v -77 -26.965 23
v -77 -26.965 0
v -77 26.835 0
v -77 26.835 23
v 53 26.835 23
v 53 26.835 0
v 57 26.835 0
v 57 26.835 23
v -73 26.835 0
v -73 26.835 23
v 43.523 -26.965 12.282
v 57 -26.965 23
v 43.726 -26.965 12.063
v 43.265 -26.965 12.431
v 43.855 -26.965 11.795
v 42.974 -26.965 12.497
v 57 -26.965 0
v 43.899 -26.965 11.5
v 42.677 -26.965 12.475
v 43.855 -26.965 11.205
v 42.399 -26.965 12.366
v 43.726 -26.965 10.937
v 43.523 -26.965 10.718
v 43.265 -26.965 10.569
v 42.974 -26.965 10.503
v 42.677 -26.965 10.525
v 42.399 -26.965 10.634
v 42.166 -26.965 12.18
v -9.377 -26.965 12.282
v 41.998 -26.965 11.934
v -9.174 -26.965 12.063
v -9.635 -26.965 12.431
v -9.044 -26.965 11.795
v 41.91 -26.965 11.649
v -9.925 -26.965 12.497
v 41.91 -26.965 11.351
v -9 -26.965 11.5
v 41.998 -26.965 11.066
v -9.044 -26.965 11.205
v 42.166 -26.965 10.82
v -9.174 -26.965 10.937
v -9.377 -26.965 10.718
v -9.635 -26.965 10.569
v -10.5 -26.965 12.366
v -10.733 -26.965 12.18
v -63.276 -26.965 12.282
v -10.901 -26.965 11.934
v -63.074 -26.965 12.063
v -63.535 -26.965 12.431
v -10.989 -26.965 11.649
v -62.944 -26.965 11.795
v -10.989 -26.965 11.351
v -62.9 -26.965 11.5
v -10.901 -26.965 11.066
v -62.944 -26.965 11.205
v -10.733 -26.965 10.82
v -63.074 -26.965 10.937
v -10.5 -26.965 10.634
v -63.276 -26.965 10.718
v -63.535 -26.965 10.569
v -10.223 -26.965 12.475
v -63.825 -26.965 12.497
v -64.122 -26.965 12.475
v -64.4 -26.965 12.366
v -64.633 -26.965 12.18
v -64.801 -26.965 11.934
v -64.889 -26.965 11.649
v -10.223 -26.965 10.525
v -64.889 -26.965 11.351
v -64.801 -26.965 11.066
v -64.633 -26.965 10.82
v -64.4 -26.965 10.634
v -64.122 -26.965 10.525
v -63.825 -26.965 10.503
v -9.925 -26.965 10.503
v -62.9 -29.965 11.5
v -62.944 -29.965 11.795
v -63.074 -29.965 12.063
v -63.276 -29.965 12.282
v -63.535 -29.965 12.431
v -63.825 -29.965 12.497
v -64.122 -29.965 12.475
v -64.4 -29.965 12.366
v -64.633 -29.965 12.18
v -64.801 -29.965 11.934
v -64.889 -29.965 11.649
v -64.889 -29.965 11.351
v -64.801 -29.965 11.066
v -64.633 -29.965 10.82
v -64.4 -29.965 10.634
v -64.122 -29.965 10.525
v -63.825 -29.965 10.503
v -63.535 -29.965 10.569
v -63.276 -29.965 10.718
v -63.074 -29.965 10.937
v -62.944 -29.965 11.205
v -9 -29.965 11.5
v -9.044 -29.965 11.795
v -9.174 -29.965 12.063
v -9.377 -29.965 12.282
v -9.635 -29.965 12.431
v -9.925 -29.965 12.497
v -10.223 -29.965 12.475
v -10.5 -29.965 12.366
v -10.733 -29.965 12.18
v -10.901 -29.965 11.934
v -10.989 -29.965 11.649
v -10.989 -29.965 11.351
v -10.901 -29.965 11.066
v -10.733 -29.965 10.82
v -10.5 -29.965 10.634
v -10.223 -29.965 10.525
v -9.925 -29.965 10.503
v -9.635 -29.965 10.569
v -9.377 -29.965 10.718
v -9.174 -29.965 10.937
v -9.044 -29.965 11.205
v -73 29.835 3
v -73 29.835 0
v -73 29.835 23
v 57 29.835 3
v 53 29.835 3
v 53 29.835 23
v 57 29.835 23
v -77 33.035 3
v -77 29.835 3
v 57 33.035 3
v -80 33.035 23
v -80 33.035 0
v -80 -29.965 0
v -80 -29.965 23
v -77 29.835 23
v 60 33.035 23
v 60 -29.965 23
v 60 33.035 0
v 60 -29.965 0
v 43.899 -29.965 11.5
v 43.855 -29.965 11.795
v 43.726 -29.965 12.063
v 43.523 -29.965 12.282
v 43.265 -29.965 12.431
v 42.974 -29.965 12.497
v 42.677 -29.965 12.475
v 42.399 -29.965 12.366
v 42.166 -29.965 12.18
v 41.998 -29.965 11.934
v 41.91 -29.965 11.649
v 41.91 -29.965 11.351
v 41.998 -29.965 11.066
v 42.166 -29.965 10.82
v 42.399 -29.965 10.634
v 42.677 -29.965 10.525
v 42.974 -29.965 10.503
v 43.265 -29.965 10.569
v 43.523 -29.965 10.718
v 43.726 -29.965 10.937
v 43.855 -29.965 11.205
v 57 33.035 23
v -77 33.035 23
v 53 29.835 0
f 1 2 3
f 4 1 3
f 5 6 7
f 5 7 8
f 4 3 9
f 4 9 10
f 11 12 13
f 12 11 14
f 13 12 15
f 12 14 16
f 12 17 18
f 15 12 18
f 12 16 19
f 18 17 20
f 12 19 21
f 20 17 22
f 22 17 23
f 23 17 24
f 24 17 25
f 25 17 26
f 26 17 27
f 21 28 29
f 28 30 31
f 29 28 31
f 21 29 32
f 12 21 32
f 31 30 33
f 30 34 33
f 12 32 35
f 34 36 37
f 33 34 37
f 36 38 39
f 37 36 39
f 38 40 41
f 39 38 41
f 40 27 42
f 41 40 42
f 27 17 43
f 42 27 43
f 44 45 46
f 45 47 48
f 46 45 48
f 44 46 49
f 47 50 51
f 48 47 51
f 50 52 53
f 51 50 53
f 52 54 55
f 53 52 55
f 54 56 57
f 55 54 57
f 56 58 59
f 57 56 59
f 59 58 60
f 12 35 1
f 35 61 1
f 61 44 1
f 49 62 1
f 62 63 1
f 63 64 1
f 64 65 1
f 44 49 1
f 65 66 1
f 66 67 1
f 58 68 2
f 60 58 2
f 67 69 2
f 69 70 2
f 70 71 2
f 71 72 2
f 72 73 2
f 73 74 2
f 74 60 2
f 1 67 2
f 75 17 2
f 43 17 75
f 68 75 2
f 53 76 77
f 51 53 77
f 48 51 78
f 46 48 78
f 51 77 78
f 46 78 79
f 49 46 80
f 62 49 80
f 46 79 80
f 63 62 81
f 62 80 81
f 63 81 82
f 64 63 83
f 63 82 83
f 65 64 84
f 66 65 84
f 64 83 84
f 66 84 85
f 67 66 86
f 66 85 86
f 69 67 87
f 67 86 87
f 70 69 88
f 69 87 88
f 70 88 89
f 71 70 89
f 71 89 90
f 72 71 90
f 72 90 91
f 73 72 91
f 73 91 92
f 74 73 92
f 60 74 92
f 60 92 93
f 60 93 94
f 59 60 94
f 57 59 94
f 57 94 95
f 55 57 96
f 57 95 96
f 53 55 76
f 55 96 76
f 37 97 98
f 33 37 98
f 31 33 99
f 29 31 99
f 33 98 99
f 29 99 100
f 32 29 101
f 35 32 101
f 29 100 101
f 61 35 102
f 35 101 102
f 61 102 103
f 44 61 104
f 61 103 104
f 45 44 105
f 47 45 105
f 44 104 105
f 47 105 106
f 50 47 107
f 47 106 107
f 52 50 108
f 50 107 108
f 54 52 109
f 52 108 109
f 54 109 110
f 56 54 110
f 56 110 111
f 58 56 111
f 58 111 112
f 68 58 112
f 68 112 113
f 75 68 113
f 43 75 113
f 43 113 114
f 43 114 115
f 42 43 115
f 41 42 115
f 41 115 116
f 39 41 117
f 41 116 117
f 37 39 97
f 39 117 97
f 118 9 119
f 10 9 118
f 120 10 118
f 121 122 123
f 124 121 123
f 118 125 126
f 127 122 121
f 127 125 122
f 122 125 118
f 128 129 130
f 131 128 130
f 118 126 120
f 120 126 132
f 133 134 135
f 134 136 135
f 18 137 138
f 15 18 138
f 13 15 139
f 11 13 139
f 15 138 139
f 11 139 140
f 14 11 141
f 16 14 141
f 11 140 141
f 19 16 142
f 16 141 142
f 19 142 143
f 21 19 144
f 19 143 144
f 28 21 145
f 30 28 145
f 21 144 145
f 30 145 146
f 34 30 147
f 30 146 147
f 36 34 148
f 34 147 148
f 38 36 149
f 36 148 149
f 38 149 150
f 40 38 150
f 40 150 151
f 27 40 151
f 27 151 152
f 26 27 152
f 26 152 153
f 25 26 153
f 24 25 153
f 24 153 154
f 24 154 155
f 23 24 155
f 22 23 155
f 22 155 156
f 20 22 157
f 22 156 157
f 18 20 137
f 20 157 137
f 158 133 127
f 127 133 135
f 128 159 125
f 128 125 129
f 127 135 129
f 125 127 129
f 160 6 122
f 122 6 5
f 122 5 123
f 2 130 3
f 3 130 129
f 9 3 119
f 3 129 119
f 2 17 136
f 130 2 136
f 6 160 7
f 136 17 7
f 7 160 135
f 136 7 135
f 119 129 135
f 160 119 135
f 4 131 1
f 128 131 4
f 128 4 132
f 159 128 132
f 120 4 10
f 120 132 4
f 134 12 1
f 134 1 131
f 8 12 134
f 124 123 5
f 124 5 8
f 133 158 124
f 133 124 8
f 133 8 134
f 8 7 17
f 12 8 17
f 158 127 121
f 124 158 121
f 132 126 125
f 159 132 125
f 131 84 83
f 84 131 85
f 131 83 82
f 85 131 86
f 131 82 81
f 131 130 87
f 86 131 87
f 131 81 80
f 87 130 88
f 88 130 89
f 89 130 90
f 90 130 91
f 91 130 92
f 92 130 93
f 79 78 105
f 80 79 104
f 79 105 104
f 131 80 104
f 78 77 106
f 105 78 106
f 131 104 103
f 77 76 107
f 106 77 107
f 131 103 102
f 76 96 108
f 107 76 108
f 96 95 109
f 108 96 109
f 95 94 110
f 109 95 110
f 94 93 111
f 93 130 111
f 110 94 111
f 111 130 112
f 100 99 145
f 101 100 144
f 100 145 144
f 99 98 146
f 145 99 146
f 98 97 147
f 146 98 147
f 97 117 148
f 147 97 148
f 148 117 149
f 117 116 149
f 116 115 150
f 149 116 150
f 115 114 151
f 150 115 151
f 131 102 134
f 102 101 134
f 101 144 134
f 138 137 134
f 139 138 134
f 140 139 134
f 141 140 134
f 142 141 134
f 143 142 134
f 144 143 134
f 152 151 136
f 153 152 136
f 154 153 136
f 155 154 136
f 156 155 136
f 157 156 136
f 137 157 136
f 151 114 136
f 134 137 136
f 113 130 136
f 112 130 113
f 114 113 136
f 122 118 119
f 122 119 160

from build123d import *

# Parameters (mm, degrees)
F0_R      = 8
F1_DEPTH  = 3
F2_W      = 3
F2_H      = 3
F2_W_2    = 134
F3_DEPTH  = 20
F4_W      = 3
F4_H      = 20
F5_DEPTH  = 134
F6_W      = 126
F6_H      = 3
F7_DEPTH  = 40
F8_R      = 1.5
F9_DEPTH  = 3
F10_R     = 8
F12_DEPTH = 40
F13_R     = 1
F14_DEPTH = 3


with BuildPart() as f1:
    # F0 (on Top) → F1 (new body)
    with BuildSketch(Plane.XY):
        Polygon((-60, 33.034884), (-80, 33.034884), (-80, 18.034884), (-80, 0.034884), (-80, -2.965116), (-80, -17.965116), (-80, -29.965116), (60, -29.965116), (60, -24.965116), (60, -14.965116), (60, -9.965116), (60, -4.965116), (60, 0.034884), (60, 18.034884), (60, 33.034884), (40, 33.034884), (20, 33.034884), (0, 33.034884), (-20, 33.034884), (-40, 33.034884), align=None)
        with Locations((25, -0.468963)):
            Circle(F0_R, mode=Mode.SUBTRACT)
        with Locations((-45, 1.034884)):
            Circle(F0_R, mode=Mode.SUBTRACT)
    extrude(amount=F1_DEPTH)

    # F2 (on face) → F3 (join)
    with BuildSketch(Plane.XY.offset(3)):
        with Locations((-78.5, -28.465116)):
            Rectangle(F2_W, F2_H)
        with Locations((-10, -28.465116)):
            Rectangle(F2_W_2, F2_H)
        Polygon((-80, 30.034884), (-80, -26.965116), (-77, -26.965116), (-77, 33.034884), (-80, 33.034884), align=None)
        with Locations((58.5, -28.465116)):
            Rectangle(F2_W, F2_H)
        Polygon((57, 33.034884), (57, -26.965116), (60, -26.965116), (60, 30.034884), (60, 33.034884), align=None)
    extrude(amount=F3_DEPTH)

    # F4 (on face) → F5 (join)
    with BuildSketch(Plane.YZ.offset(-77)):
        with Locations((28.334884, 13)):
            Rectangle(F4_W, F4_H)
    extrude(amount=F5_DEPTH)

    # F6 (on face) → F7 (cut)
    with BuildSketch(Plane.XY.offset(23)):
        with Locations((-10, 28.334884)):
            Rectangle(F6_W, F6_H)
    extrude(amount=-F7_DEPTH, mode=Mode.SUBTRACT)

    # F8 (on face) → F9 (cut)
    with BuildSketch(Plane(origin=(0, -26.965116, 0), x_dir=(-1, 0, 0), z_dir=(0, 1, 0))):
        with Locations((47, 26.988985)):
            Circle(F8_R)
        with Locations((-27, 26.988985)):
            Circle(F8_R)
        with Locations((10, 26.988985)):
            Circle(F8_R)
    extrude(amount=-F9_DEPTH, mode=Mode.SUBTRACT)

    # F10 (on face) → F12 (cut)
    with BuildSketch(Plane.XY.offset(3)):
        Polygon((53, 26.834884), (-73, 26.834884), (-77, 26.834884), (-77, -26.965116), (57, -26.965116), (57, 26.834884), align=None)
        with Locations((25, -0.468963)):
            Circle(F10_R, mode=Mode.SUBTRACT)
        with Locations((-45, 1.034884)):
            Circle(F10_R, mode=Mode.SUBTRACT)
    extrude(amount=-F12_DEPTH, mode=Mode.SUBTRACT)

    # F13 (on face) → F14 (cut)
    with BuildSketch(Plane.XZ.offset(29.965116)):
        with Locations((-63.899942, 11.5)):
            Circle(F13_R)
        with Locations((-10, 11.5)):
            Circle(F13_R)
        with Locations((42.899329, 11.5)):
            Circle(F13_R)
    extrude(amount=-F14_DEPTH, mode=Mode.SUBTRACT)


solid = f1.part
